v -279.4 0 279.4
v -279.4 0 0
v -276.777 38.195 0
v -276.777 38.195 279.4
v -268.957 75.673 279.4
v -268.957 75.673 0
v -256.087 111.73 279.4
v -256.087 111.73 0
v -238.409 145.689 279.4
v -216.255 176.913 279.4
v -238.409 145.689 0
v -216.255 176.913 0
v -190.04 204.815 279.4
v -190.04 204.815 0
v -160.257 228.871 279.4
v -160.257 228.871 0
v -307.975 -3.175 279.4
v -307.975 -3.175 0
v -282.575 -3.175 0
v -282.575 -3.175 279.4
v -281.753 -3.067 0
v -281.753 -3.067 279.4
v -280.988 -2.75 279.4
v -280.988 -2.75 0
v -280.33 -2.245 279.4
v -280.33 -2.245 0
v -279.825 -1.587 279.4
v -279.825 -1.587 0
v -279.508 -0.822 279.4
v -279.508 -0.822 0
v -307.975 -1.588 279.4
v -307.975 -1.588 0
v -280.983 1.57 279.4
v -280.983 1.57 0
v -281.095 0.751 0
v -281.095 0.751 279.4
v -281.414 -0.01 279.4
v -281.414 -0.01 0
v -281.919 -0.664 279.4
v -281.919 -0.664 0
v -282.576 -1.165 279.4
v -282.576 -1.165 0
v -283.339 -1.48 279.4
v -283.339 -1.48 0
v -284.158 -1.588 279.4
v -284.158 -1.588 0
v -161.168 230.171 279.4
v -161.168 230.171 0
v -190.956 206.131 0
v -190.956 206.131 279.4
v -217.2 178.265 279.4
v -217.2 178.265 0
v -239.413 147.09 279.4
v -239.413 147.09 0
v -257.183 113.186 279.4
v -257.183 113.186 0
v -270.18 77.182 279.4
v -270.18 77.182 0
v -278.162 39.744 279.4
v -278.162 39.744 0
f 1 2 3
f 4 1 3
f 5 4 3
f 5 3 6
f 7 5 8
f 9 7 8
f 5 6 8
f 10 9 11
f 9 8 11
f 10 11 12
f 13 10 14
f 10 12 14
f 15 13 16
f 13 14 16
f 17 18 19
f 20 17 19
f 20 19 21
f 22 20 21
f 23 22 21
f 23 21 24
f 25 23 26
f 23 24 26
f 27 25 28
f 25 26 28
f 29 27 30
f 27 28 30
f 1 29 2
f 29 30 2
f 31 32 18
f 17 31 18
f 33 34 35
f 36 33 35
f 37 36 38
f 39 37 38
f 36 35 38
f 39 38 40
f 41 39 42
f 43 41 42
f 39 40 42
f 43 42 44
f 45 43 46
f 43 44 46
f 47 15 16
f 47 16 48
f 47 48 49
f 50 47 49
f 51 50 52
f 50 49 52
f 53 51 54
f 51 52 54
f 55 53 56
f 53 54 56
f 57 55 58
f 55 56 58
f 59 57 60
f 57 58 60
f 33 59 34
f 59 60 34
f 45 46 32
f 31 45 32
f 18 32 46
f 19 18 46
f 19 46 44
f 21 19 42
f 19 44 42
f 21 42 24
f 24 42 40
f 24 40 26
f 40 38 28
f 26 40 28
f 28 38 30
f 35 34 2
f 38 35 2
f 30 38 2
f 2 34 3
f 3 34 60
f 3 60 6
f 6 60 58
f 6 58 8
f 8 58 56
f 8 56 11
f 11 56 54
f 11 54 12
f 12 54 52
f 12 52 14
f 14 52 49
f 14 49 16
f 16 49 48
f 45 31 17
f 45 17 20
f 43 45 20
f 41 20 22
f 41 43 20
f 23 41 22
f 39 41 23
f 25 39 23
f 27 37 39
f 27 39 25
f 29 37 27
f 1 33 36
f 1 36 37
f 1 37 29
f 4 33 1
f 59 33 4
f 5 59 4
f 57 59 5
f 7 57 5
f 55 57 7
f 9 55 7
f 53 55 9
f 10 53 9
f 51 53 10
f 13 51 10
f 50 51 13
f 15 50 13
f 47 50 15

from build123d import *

# Parameters (mm, degrees)
BOSS_EXTRUDE1_DEPTH = 279.4


with BuildPart() as part:
    # Sketch1 → Boss-Extrude1 (new body)
    with BuildSketch(Plane.XY):
        with BuildLine():
            Line((-284.158065608, -1.5875), (-307.975, -1.5875))
            Line((-307.975, -1.5875), (-307.975, -3.175))
            Line((-307.975, -3.175), (-282.575, -3.175))
            ThreePointArc((-282.575, -3.175), (-280.32993597, -2.24506403), (-279.4, 0))
            ThreePointArc((-279.4, 0), (-247.83082679, 129.012562538), (-160.257256316, 228.871081174))
            Line((-160.257256316, 228.871081174), (-161.167808909, 230.171485045))
            ThreePointArc((-161.167808909, 230.171485045), (-248.875564876, 130.441283205), (-280.983115154, 1.56976257))
            ThreePointArc((-280.983115154, 1.56976257), (-281.919281489, -0.663826425), (-284.158065608, -1.5875))
        make_face()
    extrude(amount=BOSS_EXTRUDE1_DEPTH)


solid = part.part
